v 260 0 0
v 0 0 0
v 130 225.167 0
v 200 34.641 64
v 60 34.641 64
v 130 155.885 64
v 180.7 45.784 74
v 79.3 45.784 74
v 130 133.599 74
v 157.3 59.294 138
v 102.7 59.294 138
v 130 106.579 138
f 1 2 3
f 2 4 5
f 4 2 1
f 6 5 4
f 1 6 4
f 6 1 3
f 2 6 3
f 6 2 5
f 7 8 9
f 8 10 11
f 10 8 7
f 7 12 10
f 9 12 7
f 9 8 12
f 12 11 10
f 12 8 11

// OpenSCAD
$fn = 100;



module stage (a, b, z) {
    h1 = sqrt(a^2 - (a/2)^2);
    h2 = sqrt(b^2 - (b/2)^2);
    
    A2_x = (a - b) / 2;
    A2_y = h1 / 3 - h2 / 3; // Center the top triangle in y
    
    B2_x = A2_x + b;
    B2_y = A2_y;
    
    C2_x = A2_x + b/2;
    C2_y = A2_y + h2;

    polyhedron(
            [
                [0, 0, 0],
                [a/2, h1, 0],
                [a, 0, 0],
                [A2_x, A2_y, z],
                [C2_x, C2_y, z],
                [B2_x, B2_y, z],
            ],
            [
                [2, 1, 0], // bottom
                [3, 4, 5], // top
                [1, 4, 3, 0],
                [2, 5, 4, 1],
                [0, 3, 5, 2],
            ]
    );
}


step_between = 10;
height = 64;

max_val = 3;
initial_base = 260;
initial_top = 140;
h = sqrt(initial_base^2 - (initial_base/2)^2);


for (i = [0:max_val]) {
    current_base = initial_base - initial_base*0.61*i;
    current_top = initial_top - initial_top*0.61*i;
        
    translate([
        (initial_base - current_base) / 2,
        h * 1/3 * i*0.61,
        i*(height + step_between)]){
            stage(current_base, current_top, height);
    }
}

//    h1 = sqrt(base^2 - (base/2)^2);
//    h2 = sqrt(base2^2 - (base2/2)^2);
//
//    h3 = sqrt(base3^2 - (base3/2)^2);
//    h4 = sqrt(base4^2 - (base4/2)^2);

//    translate([(base1 - base2) / 2, (h1 - h2)/3, height + step_between]) 

    
//stage(base1, top1, height);
//
//h1 = sqrt(base1^2 - (base1/2)^2);
//h2 = sqrt(base2^2 - (base2/2)^2);
//
//h3 = sqrt(base3^2 - (base3/2)^2);
//h4 = sqrt(base4^2 - (base4/2)^2);
//
//translate([(base1 - base2) / 2, (h1 - h2)/3, height + step_between]) {
//    stage(base2, top2, height);
//    translate([(base2 - base3) / 2, (h2 - h3) / 3, height + step_between]) {
//        stage(base3, top3, height);
//        translate([(base3 - base4) /2 , (h3 - h4) / 3, height + step_between]) {
//            stage(base4, top4, height);
//        }
//    }
//}
